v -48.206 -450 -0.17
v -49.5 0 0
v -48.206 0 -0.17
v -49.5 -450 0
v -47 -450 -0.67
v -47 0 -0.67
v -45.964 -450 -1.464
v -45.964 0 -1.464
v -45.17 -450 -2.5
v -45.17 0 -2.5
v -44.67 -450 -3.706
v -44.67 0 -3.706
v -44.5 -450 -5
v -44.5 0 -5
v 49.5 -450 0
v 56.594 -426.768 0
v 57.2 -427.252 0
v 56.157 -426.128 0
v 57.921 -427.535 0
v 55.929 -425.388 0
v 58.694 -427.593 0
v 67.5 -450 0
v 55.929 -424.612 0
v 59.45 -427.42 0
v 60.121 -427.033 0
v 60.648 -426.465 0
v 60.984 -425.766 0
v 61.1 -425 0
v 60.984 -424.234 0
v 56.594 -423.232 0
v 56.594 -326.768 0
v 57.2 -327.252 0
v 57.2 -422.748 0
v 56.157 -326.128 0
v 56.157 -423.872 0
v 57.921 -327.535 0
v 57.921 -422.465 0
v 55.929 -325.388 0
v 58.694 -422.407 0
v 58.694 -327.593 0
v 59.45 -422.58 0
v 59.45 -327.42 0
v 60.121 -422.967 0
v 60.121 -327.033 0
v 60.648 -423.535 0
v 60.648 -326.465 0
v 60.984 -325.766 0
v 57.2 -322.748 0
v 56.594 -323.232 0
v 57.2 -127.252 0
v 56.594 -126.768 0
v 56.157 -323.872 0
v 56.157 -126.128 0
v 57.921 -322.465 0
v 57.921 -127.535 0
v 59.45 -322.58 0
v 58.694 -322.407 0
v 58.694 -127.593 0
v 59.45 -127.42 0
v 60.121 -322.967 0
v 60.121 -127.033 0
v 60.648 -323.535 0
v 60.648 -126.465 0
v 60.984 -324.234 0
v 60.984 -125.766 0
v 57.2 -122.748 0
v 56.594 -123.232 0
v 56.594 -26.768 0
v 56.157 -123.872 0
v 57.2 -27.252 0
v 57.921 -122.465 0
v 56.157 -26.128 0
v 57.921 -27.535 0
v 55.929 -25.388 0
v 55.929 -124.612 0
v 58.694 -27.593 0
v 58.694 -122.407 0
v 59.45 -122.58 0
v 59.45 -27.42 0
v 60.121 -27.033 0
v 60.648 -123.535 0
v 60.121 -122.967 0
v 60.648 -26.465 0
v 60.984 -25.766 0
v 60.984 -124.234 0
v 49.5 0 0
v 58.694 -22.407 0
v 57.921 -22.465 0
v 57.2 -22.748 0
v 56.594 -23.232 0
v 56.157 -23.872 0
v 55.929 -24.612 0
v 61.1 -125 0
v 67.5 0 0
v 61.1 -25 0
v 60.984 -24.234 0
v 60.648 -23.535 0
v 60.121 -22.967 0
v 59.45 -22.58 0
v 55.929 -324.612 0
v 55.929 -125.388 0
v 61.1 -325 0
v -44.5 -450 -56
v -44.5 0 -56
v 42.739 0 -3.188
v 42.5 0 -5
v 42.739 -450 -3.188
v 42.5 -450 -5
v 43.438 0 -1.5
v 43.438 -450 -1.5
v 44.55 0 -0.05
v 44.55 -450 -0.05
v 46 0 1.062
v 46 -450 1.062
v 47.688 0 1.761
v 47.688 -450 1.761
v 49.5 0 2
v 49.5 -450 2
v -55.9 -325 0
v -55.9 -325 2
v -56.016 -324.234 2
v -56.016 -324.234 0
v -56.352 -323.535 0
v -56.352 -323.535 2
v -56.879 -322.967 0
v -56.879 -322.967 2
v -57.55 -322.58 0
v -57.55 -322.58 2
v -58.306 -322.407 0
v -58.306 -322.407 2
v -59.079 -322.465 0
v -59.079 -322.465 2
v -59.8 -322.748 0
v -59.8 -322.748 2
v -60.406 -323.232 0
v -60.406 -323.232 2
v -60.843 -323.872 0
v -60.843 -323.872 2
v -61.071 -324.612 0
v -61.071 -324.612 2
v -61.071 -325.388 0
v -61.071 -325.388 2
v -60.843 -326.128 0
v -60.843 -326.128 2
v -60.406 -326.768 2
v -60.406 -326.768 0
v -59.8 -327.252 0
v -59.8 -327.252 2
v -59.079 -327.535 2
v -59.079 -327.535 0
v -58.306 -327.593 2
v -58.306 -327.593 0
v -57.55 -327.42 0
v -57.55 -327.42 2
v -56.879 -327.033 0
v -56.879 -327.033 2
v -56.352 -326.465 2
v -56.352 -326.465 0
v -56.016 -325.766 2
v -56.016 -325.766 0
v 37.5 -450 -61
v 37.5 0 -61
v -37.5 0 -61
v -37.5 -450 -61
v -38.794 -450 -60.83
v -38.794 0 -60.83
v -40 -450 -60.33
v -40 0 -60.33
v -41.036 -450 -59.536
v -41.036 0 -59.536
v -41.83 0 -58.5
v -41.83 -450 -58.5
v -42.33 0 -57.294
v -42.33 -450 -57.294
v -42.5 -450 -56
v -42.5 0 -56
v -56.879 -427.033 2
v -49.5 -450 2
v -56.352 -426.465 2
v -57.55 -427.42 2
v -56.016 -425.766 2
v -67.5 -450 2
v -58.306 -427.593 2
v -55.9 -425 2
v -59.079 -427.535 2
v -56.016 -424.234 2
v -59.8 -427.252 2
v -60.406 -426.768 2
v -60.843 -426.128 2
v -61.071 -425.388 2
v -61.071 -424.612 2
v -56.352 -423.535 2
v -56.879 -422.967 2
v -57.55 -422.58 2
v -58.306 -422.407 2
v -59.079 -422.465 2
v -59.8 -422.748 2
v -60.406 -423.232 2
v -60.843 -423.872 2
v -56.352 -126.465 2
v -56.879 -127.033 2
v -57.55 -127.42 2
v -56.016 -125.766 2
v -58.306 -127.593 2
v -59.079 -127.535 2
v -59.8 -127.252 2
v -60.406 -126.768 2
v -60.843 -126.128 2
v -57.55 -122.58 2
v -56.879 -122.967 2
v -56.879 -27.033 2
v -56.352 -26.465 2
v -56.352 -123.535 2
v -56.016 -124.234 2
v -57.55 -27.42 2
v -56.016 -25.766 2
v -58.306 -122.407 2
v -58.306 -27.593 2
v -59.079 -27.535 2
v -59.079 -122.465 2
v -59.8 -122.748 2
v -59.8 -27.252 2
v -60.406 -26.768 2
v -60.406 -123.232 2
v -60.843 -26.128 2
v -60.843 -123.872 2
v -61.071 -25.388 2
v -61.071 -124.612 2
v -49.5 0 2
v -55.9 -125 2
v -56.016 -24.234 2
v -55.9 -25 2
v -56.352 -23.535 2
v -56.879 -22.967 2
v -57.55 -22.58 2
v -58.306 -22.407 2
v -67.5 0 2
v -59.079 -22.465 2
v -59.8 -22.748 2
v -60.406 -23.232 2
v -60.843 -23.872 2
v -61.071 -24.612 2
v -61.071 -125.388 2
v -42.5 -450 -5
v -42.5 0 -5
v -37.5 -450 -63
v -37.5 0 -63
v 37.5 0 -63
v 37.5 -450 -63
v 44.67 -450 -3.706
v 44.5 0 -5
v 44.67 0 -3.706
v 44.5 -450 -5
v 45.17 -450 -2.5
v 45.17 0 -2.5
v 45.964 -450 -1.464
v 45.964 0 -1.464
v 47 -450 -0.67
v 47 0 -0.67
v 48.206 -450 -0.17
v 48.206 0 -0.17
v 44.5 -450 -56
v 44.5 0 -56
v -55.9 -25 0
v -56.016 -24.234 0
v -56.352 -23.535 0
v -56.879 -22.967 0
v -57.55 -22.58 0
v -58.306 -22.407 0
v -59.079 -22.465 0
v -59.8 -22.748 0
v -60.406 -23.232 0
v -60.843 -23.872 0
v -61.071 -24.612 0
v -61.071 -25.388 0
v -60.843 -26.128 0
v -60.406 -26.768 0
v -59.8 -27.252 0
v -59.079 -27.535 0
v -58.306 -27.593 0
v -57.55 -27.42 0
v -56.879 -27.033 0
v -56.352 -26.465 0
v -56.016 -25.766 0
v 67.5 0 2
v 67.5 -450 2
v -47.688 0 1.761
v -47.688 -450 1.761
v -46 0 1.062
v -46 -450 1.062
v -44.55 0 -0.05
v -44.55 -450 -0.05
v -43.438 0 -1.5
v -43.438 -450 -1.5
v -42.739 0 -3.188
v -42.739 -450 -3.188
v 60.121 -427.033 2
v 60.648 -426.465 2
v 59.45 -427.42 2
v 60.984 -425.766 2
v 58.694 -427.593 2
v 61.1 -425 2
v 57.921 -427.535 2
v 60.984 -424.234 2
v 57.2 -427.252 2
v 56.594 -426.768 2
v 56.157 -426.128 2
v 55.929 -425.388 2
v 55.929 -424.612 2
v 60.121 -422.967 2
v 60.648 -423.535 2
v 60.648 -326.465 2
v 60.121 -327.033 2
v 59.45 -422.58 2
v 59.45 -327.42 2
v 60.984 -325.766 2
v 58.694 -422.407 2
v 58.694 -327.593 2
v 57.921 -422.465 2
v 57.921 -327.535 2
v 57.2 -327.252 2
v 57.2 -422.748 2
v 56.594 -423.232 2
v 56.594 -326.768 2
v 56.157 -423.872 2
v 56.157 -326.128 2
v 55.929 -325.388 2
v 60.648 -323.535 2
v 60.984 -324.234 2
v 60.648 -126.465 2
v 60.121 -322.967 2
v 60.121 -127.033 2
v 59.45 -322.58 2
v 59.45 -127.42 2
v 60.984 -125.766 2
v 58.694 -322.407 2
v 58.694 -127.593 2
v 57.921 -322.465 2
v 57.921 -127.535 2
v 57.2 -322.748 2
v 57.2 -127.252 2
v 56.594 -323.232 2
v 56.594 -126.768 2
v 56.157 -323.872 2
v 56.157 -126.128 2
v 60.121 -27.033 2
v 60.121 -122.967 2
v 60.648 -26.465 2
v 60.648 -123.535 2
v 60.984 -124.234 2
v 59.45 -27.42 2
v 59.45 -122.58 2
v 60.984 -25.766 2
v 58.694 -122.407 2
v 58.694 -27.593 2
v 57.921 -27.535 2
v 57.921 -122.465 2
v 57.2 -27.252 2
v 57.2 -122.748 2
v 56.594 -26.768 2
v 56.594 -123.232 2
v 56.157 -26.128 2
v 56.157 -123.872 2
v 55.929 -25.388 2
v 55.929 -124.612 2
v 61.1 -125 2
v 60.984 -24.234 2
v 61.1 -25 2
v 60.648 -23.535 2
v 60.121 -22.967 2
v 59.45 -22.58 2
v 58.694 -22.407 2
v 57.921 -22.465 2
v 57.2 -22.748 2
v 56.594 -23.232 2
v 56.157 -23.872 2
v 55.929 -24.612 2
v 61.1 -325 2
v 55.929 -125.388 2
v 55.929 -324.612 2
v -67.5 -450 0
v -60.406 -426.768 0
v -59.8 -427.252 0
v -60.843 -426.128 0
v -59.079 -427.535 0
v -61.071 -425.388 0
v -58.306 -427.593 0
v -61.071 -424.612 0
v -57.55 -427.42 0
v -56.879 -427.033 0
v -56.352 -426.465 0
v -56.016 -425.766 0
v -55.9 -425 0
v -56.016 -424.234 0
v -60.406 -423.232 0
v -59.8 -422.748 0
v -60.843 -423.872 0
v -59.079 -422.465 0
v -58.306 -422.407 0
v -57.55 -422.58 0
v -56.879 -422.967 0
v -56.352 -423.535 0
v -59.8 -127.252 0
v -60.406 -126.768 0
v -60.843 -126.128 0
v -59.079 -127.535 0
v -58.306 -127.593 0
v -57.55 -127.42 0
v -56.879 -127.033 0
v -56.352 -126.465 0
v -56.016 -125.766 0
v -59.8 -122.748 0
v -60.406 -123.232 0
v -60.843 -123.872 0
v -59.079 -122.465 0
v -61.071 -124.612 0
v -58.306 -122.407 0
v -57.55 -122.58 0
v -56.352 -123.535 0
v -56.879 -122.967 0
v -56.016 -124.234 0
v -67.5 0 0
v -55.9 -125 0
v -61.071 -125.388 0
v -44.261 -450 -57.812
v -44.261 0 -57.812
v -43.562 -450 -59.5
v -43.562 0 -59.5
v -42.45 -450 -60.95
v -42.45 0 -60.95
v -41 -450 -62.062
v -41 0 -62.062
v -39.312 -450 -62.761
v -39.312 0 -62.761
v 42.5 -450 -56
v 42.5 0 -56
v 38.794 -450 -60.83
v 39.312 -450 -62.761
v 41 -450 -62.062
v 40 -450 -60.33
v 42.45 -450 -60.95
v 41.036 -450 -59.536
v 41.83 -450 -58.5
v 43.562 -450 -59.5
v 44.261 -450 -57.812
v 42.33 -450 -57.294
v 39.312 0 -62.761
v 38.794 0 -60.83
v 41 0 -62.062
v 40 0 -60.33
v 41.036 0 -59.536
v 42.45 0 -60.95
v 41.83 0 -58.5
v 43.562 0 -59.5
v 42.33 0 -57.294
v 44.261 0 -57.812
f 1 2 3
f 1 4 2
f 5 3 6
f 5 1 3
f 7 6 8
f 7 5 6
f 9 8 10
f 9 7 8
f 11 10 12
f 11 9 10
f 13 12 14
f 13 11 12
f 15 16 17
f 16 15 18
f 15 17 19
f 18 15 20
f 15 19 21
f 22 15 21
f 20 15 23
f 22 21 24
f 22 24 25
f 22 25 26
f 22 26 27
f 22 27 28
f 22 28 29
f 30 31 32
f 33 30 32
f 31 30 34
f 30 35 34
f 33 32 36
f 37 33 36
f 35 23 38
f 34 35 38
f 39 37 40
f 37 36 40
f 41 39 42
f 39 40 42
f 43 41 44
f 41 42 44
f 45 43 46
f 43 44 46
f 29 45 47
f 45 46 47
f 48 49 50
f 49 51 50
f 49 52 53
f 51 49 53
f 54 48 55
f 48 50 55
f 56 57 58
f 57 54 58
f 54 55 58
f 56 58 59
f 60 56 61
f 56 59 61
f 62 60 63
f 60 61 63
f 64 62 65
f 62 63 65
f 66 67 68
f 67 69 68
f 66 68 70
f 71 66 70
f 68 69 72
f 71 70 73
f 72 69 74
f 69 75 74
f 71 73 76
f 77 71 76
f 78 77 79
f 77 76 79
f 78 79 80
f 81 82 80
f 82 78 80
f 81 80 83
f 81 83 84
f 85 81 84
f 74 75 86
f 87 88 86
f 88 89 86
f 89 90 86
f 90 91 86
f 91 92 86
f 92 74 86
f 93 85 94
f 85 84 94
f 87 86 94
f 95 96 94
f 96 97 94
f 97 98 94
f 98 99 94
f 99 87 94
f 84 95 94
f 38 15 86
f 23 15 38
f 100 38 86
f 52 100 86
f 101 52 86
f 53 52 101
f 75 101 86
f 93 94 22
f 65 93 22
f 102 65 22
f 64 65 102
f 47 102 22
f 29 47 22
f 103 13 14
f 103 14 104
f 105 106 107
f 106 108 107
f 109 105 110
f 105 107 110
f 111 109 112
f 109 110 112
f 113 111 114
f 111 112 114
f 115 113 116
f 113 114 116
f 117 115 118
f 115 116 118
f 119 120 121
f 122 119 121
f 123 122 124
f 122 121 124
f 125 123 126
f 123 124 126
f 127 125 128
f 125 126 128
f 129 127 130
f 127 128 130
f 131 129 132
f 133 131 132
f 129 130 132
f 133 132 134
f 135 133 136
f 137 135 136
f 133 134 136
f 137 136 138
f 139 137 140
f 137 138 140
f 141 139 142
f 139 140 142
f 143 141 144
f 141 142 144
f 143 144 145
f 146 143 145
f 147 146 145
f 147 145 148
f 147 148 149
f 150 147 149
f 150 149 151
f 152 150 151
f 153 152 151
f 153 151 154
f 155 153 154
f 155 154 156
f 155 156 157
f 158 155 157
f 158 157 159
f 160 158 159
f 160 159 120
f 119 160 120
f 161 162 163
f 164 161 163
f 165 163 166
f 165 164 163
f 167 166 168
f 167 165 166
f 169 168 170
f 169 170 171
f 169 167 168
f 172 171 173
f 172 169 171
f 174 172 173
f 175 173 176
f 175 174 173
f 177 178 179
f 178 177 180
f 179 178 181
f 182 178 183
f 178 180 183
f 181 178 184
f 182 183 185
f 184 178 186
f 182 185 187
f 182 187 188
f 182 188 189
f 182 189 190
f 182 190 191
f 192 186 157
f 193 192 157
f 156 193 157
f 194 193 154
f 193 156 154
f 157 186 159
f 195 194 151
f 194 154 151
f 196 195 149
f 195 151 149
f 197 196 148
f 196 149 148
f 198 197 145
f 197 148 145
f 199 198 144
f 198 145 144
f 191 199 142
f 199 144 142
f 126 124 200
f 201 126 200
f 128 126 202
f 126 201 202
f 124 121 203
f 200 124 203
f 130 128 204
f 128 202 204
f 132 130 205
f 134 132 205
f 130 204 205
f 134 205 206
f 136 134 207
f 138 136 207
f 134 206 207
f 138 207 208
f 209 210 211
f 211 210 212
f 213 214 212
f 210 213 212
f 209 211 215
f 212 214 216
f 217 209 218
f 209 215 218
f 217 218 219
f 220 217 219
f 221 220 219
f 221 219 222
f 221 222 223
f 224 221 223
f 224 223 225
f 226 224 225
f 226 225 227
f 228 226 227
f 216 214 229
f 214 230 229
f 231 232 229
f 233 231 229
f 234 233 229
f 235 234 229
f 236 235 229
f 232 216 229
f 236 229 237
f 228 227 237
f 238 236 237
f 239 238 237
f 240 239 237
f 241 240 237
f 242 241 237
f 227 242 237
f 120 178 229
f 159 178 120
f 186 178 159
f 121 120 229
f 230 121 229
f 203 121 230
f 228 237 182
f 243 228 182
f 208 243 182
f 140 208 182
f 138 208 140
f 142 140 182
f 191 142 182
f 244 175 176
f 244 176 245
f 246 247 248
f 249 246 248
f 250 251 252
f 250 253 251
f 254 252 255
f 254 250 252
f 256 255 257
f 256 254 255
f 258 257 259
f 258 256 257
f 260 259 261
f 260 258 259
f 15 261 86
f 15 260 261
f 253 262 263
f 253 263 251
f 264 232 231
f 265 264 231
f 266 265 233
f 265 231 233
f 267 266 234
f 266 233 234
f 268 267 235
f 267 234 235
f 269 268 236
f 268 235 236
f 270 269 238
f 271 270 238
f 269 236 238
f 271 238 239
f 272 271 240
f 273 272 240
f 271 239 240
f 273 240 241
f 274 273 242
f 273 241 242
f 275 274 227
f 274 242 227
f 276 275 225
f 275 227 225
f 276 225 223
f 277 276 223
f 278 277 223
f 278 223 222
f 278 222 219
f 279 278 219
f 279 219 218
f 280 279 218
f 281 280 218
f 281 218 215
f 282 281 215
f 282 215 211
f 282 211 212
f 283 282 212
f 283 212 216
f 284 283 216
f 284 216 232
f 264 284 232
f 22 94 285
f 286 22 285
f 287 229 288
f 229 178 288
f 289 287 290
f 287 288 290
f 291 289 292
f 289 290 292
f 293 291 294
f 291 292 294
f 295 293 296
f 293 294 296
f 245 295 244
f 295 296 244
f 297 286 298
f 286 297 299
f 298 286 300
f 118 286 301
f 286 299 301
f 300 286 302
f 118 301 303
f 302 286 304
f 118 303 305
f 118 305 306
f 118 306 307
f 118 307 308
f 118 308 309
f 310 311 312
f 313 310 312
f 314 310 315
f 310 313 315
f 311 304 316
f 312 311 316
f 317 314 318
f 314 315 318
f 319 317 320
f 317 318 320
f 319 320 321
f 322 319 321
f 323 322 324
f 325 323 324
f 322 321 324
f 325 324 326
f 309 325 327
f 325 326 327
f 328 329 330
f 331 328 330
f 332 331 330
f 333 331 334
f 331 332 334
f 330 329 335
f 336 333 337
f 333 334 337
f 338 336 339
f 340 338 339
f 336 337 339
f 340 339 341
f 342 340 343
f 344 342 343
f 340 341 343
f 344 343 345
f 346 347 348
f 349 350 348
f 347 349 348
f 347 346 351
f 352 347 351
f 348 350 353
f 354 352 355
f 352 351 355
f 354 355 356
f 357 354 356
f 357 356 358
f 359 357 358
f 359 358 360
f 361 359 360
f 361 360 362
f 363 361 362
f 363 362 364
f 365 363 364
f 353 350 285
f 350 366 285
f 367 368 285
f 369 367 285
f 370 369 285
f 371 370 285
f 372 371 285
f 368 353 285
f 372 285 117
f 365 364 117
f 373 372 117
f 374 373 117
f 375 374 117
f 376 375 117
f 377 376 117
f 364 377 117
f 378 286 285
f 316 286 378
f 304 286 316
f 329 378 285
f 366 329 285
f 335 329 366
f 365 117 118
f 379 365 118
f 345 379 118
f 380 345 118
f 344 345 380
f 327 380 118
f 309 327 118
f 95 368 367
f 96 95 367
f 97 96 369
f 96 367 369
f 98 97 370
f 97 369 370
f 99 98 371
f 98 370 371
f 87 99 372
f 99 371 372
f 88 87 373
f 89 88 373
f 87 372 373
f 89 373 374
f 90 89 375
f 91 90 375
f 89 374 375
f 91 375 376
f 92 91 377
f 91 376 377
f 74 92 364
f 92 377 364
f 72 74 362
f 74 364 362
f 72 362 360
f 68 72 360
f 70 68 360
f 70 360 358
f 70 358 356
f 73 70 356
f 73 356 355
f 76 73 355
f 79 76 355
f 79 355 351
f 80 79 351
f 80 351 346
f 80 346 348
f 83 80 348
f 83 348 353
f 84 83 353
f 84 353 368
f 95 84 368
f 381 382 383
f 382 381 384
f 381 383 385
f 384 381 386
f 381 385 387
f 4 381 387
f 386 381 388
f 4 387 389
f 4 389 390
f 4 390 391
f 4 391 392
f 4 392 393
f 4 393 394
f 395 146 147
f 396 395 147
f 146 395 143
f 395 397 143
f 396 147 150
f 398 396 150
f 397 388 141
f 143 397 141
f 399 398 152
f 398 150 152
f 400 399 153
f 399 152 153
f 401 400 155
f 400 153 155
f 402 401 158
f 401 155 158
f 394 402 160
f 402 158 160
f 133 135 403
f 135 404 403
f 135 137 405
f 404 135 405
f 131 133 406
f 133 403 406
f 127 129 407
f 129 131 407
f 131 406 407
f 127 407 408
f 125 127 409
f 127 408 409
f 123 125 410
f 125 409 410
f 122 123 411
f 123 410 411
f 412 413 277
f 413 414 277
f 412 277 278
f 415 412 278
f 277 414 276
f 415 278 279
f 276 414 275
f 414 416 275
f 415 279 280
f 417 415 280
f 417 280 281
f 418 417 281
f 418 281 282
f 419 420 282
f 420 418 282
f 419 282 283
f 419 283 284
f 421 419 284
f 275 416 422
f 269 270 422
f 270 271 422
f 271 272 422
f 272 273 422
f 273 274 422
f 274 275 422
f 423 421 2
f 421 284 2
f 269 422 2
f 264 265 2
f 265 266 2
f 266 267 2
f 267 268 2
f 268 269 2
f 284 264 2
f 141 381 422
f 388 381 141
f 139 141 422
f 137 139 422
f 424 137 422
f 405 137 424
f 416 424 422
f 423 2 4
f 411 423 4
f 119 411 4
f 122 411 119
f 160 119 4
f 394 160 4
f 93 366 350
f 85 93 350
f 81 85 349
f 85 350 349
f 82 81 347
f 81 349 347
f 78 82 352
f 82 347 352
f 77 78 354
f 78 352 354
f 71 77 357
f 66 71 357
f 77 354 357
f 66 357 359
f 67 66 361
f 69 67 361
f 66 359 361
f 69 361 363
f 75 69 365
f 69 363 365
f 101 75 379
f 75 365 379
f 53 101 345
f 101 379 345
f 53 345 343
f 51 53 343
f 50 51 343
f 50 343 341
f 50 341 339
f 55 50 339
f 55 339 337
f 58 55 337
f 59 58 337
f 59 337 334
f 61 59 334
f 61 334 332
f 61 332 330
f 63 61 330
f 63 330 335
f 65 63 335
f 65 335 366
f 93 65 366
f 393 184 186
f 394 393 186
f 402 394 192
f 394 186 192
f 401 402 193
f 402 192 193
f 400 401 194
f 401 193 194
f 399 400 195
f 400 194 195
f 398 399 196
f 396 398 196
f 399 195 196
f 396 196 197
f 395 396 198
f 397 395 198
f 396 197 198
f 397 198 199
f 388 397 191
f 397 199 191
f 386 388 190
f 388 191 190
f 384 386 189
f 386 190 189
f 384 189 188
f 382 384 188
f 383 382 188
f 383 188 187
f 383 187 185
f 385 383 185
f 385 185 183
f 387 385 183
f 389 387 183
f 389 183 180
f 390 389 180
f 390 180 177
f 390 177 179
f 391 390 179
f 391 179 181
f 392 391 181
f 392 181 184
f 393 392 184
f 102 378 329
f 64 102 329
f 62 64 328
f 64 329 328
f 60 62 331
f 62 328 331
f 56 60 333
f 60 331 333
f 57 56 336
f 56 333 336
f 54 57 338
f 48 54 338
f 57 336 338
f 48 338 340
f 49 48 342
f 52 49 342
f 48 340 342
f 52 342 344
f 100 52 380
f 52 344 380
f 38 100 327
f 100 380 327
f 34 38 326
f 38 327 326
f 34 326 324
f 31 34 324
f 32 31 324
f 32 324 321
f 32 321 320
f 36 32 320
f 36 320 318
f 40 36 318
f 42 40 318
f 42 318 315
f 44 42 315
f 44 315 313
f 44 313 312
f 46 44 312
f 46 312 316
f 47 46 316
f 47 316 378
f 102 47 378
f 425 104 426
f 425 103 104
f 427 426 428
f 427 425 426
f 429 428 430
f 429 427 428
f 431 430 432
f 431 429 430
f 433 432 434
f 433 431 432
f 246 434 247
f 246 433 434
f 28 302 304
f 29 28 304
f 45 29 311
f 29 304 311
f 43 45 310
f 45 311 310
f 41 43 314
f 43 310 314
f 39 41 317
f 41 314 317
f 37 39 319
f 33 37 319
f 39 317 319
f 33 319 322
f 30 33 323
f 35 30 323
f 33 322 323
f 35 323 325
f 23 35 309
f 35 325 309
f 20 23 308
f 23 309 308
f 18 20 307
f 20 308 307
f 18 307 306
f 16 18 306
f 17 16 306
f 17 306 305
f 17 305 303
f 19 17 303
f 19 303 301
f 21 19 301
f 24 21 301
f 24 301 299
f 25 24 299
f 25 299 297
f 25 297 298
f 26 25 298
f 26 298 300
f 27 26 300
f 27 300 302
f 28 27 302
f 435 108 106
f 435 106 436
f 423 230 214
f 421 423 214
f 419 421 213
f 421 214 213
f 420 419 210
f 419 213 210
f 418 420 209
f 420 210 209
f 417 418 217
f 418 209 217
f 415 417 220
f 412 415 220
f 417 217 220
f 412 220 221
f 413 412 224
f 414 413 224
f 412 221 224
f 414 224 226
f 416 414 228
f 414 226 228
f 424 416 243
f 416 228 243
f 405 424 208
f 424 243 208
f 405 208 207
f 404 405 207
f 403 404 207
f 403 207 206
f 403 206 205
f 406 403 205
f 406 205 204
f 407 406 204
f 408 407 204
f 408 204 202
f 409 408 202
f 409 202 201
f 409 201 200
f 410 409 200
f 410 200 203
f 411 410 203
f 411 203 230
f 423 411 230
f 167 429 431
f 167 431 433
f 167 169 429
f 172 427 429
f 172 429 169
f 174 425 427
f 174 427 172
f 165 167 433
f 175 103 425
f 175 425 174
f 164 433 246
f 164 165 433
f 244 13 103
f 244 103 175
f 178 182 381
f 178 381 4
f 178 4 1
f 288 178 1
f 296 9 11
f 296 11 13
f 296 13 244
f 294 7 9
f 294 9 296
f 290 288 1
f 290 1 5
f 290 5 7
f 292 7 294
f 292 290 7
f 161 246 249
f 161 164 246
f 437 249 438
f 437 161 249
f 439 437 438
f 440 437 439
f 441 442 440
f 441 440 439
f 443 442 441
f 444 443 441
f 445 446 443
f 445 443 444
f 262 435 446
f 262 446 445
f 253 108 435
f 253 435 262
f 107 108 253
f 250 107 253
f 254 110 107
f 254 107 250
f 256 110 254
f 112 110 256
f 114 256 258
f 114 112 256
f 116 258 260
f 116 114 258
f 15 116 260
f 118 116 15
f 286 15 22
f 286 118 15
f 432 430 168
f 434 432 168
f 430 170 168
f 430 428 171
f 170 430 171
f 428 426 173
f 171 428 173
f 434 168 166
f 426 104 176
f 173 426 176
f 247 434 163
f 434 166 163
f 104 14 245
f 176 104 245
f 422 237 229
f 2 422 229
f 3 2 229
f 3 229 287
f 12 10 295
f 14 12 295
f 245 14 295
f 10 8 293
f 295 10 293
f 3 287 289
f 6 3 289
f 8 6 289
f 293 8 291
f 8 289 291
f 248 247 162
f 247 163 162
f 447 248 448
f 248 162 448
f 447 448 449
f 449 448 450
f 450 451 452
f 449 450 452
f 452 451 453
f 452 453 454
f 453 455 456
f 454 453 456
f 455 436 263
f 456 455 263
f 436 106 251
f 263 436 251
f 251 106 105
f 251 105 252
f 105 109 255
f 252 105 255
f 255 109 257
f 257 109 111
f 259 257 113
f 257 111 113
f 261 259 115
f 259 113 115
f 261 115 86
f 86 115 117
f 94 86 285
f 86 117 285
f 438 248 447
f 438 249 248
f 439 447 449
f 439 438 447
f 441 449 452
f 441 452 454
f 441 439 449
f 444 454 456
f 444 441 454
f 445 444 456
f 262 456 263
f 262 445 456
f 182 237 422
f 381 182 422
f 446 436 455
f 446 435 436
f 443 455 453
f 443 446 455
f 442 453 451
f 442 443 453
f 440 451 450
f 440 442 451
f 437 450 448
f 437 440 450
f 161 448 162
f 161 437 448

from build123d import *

# Parameters (mm, degrees)
F1_DEPTH = 450
F2_R     = 5
F3_R     = 7
F4_R     = 2.6
F5_DEPTH = 25


with BuildPart() as f1:
    # F0 (on Front) → F1 (new body)
    with BuildSketch(Plane.XZ):
        Polygon((-67.5, 2), (-67.5, 0), (-44.5, 0), (-44.5, -63), (0, -63), (44.5, -63), (44.5, 0), (67.5, 0), (67.5, 2), (42.5, 2), (42.5, -61), (0, -61), (-42.5, -61), (-42.5, 2), align=None)
    extrude(amount=F1_DEPTH)

    # F2
    f2_edges = [f1.edges().sort_by_distance(p)[0] for p in [
        (-42.5, -225, -61),
        (44.5, -225, 0),
        (-44.5, -225, 0),
        (42.5, -225, -61),
    ]]
    fillet(f2_edges, radius=F2_R)

    # F3
    f3_edges = [f1.edges().sort_by_distance(p)[0] for p in [
        (-42.5, -225, 2),
        (44.5, -225, -63),
        (42.5, -225, 2),
        (-44.5, -225, -63),
    ]]
    fillet(f3_edges, radius=F3_R)

    # F4 (on face) → F5 (cut)
    with BuildSketch(Plane.XY.offset(2)):
        with Locations((58.5, -425)):
            Circle(F4_R)
        with Locations((58.5, -325)):
            Circle(F4_R)
        with Locations((58.5, -125)):
            Circle(F4_R)
        with Locations((58.5, -25)):
            Circle(F4_R)
        with Locations((-58.5, -25)):
            Circle(F4_R)
        with Locations((-58.5, -125)):
            Circle(F4_R)
        with Locations((-58.5, -325)):
            Circle(F4_R)
        with Locations((-58.5, -425)):
            Circle(F4_R)
    extrude(amount=-F5_DEPTH, mode=Mode.SUBTRACT)


solid = f1.part
